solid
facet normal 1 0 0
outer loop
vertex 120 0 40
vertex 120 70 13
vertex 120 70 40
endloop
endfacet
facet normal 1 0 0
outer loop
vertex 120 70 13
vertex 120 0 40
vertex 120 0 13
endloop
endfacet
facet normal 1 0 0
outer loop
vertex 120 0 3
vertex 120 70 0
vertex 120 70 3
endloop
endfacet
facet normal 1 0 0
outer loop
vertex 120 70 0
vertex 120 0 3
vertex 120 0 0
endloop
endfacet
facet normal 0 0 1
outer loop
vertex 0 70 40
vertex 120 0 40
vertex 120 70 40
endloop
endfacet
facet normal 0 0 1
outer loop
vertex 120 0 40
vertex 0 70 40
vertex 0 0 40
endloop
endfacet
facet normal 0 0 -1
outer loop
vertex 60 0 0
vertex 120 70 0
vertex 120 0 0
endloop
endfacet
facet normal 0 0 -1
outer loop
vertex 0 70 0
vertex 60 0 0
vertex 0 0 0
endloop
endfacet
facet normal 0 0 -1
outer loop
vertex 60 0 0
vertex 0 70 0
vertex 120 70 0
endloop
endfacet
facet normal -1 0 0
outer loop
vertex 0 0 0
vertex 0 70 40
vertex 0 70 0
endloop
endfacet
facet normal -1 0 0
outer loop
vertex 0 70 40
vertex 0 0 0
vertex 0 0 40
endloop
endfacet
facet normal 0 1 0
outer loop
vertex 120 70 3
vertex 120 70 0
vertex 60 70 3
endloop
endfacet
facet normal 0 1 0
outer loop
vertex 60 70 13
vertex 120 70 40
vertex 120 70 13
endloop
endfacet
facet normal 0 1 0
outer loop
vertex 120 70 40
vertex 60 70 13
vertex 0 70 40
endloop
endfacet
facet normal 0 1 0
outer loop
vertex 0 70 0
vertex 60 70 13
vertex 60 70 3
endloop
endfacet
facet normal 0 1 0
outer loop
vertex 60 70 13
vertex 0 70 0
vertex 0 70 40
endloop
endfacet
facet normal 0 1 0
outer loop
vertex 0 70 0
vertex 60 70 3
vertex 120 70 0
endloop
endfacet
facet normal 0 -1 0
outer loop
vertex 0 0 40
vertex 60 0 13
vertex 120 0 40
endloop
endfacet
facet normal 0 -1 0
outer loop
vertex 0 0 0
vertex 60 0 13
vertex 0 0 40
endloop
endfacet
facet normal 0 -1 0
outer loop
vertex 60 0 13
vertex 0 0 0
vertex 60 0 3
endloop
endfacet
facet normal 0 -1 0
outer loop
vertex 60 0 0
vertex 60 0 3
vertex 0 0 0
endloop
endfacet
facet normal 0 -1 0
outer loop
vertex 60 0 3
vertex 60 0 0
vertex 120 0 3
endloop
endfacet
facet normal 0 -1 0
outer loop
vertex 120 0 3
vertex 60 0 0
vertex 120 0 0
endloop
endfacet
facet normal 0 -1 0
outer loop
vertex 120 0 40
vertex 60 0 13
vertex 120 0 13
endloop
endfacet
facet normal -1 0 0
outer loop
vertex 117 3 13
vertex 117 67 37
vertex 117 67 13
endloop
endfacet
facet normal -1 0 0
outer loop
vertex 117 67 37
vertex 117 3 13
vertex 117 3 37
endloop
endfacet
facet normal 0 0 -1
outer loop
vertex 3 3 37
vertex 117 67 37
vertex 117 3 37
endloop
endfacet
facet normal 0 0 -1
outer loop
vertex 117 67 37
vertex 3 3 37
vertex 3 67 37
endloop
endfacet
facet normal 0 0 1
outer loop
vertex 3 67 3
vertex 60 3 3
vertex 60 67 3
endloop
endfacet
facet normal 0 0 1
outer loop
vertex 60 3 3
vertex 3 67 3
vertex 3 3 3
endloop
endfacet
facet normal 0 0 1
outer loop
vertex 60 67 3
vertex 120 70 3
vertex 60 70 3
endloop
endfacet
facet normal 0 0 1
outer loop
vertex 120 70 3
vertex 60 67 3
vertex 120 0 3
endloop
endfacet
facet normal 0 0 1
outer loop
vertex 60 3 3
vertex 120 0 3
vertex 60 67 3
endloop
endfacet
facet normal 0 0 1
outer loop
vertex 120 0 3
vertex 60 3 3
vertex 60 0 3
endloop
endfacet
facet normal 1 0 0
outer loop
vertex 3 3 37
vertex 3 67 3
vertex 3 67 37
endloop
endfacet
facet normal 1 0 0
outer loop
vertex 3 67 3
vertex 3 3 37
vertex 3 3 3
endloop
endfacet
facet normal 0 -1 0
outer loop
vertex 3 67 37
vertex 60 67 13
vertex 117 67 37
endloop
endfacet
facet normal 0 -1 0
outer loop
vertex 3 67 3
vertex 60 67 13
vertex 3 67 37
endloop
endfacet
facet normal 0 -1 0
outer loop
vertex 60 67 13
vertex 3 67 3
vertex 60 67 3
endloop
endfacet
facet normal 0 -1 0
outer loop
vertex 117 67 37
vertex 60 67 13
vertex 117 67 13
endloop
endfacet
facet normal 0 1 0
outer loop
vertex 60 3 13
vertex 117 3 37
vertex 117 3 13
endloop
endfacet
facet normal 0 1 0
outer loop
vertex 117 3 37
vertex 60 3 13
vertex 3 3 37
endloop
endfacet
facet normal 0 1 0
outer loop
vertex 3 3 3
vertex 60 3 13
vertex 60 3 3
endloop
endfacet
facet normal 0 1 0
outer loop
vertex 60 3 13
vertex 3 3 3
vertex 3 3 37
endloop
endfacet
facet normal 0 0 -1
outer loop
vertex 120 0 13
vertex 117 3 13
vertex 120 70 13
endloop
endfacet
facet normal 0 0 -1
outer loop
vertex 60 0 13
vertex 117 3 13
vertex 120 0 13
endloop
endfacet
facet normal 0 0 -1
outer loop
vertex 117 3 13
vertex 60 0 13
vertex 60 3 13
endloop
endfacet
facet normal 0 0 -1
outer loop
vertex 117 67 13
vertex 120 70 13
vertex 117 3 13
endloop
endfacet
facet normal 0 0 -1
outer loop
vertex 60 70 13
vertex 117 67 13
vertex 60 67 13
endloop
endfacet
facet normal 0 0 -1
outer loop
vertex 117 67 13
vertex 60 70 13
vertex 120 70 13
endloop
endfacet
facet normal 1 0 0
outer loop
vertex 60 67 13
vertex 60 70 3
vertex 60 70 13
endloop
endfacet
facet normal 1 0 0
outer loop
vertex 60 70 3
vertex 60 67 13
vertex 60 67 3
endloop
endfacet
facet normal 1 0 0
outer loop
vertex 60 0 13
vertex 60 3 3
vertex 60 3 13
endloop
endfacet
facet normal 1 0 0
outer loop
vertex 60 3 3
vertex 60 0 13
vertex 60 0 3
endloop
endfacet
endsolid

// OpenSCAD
// Buffer tank for a mini horizontal gel-electrophoresis box. Open-top rectangular tank with a
// solid raised platform in the middle that divides the bottom into two buffer chambers. Each
// chamber has a horizontal electrode hole through an end wall. NOVEL general part.
//

L     = 120;
W     = 70;
H     = 40;
wall  = 3;
floor = 3;
plat_X = 60;
plat_Z = 10;
hole  = 2;

$fn = 64;

inner_H = H - wall;
inner_W = W - 2 * wall;
inner_L = L - 2 * wall;

difference() {
    cube([L, W, H]);
    translate([wall, wall, wall]) cube([inner_L, inner_W, inner_H - floor]);     // remove inner volume, leaving floor
    translate([plat_X, 0, floor]) cube([plat_X, W, plat_Z]);                      // remove the lower part of the central platform so it rests on the floor
    for (x = [-L / 2, L / 2])
        translate([x, 0, -1]) rotate([-90, 0, 0]) cylinder(h = H + 2, d = hole);  // electrode holes through the end walls
}
